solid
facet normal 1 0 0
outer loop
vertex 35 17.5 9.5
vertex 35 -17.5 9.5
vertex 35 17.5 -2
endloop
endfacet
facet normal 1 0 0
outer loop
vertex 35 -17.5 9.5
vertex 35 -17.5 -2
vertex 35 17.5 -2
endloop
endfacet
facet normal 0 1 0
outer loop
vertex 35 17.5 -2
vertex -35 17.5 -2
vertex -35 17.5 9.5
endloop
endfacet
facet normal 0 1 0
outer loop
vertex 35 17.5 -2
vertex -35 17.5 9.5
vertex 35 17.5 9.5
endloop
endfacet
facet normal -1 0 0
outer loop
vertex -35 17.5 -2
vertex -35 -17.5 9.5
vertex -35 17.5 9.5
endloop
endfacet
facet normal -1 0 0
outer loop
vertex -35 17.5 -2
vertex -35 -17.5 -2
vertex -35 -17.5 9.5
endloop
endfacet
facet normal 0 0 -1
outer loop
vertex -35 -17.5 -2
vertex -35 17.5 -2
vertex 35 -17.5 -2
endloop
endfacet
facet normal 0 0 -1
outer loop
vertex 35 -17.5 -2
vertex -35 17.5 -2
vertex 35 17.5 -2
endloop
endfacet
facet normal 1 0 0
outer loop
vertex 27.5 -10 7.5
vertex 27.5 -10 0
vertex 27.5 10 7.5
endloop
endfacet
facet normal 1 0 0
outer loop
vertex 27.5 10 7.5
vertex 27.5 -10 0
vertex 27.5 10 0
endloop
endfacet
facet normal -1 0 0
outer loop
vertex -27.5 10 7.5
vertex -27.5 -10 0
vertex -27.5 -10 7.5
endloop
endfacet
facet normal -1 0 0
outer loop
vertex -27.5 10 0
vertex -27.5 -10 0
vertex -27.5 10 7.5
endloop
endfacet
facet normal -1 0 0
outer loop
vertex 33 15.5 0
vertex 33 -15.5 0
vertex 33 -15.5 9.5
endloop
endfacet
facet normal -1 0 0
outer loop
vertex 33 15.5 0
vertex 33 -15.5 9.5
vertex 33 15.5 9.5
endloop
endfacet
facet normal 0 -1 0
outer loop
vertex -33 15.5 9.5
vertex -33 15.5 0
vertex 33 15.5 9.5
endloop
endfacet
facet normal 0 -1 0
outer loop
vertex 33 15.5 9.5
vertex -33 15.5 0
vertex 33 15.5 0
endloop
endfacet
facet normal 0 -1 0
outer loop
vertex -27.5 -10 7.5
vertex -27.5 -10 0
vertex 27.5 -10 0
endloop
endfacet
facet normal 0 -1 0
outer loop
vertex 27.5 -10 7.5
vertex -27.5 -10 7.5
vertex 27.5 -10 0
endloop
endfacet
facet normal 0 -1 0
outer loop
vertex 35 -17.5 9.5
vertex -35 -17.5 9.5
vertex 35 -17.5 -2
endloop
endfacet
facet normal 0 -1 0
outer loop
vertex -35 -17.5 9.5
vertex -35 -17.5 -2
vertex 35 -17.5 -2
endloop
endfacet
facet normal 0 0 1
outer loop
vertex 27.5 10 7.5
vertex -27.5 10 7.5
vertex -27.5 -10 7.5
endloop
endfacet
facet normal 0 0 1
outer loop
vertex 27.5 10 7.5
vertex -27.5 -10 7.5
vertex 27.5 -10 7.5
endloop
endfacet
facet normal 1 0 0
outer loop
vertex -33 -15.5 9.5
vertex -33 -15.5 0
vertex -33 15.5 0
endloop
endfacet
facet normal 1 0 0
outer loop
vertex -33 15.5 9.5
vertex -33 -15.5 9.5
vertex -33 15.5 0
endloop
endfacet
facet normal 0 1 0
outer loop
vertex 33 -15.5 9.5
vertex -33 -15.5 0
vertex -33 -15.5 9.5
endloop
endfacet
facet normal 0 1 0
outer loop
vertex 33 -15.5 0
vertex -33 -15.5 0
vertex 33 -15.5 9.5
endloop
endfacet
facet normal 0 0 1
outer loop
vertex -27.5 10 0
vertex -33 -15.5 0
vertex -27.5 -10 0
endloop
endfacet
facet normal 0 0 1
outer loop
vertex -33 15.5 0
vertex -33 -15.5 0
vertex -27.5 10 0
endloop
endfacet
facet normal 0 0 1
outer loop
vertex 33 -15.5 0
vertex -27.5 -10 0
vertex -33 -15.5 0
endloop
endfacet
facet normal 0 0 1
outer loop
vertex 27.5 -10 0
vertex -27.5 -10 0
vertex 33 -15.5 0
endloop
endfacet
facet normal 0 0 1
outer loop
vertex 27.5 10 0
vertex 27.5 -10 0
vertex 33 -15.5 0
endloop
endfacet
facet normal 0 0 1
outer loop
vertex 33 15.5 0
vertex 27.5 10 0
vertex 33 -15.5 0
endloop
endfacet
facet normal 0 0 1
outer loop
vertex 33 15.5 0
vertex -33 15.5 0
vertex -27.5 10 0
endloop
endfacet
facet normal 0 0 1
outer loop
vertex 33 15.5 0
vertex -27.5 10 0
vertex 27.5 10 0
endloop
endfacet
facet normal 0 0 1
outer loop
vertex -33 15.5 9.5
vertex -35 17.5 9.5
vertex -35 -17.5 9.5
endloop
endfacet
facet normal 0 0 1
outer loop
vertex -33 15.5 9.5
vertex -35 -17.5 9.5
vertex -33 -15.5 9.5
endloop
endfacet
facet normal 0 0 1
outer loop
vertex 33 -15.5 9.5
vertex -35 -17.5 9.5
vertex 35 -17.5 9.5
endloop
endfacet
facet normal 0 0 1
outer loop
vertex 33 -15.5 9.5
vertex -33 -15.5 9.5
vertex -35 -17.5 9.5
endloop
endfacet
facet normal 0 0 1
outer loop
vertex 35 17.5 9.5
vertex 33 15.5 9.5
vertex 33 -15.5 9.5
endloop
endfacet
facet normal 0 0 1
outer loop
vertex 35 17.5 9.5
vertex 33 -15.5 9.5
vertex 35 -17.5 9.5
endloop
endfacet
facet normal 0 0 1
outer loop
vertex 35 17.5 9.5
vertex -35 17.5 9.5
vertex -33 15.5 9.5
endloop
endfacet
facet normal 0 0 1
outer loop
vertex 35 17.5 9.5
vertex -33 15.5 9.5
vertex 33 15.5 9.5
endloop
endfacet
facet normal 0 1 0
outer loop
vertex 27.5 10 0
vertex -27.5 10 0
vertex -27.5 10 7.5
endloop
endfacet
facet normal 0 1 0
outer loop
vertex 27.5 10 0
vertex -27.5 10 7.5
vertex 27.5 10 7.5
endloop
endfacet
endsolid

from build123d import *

# Parameters (mm, degrees)
SKETCH1_W           = 70
SKETCH1_H           = 35
BOSS_EXTRUDE1_DEPTH = 2
SKETCH1_3_W         = 70
SKETCH1_3_H         = 35
SKETCH1_3_W_2       = 66
SKETCH1_3_H_2       = 31
BOSS_EXTRUDE2_DEPTH = 9.5
SKETCH1_4_W         = 55
SKETCH1_4_H         = 20
BOSS_EXTRUDE3_DEPTH = 7.5


with BuildPart() as part:
    # Sketch1 → Boss-Extrude1 (new body)
    with BuildSketch(Plane.XY):
        Rectangle(SKETCH1_W, SKETCH1_H)
    extrude(amount=-BOSS_EXTRUDE1_DEPTH)

    # Sketch1<3> → Boss-Extrude2 (add)
    with BuildSketch(Plane.XY):
        Rectangle(SKETCH1_3_W, SKETCH1_3_H)
        Rectangle(SKETCH1_3_W_2, SKETCH1_3_H_2, mode=Mode.SUBTRACT)
    extrude(amount=BOSS_EXTRUDE2_DEPTH)

    # Sketch1<4> → Boss-Extrude3 (add)
    with BuildSketch(Plane.XY):
        Rectangle(SKETCH1_4_W, SKETCH1_4_H)
    extrude(amount=BOSS_EXTRUDE3_DEPTH)


solid = part.part
